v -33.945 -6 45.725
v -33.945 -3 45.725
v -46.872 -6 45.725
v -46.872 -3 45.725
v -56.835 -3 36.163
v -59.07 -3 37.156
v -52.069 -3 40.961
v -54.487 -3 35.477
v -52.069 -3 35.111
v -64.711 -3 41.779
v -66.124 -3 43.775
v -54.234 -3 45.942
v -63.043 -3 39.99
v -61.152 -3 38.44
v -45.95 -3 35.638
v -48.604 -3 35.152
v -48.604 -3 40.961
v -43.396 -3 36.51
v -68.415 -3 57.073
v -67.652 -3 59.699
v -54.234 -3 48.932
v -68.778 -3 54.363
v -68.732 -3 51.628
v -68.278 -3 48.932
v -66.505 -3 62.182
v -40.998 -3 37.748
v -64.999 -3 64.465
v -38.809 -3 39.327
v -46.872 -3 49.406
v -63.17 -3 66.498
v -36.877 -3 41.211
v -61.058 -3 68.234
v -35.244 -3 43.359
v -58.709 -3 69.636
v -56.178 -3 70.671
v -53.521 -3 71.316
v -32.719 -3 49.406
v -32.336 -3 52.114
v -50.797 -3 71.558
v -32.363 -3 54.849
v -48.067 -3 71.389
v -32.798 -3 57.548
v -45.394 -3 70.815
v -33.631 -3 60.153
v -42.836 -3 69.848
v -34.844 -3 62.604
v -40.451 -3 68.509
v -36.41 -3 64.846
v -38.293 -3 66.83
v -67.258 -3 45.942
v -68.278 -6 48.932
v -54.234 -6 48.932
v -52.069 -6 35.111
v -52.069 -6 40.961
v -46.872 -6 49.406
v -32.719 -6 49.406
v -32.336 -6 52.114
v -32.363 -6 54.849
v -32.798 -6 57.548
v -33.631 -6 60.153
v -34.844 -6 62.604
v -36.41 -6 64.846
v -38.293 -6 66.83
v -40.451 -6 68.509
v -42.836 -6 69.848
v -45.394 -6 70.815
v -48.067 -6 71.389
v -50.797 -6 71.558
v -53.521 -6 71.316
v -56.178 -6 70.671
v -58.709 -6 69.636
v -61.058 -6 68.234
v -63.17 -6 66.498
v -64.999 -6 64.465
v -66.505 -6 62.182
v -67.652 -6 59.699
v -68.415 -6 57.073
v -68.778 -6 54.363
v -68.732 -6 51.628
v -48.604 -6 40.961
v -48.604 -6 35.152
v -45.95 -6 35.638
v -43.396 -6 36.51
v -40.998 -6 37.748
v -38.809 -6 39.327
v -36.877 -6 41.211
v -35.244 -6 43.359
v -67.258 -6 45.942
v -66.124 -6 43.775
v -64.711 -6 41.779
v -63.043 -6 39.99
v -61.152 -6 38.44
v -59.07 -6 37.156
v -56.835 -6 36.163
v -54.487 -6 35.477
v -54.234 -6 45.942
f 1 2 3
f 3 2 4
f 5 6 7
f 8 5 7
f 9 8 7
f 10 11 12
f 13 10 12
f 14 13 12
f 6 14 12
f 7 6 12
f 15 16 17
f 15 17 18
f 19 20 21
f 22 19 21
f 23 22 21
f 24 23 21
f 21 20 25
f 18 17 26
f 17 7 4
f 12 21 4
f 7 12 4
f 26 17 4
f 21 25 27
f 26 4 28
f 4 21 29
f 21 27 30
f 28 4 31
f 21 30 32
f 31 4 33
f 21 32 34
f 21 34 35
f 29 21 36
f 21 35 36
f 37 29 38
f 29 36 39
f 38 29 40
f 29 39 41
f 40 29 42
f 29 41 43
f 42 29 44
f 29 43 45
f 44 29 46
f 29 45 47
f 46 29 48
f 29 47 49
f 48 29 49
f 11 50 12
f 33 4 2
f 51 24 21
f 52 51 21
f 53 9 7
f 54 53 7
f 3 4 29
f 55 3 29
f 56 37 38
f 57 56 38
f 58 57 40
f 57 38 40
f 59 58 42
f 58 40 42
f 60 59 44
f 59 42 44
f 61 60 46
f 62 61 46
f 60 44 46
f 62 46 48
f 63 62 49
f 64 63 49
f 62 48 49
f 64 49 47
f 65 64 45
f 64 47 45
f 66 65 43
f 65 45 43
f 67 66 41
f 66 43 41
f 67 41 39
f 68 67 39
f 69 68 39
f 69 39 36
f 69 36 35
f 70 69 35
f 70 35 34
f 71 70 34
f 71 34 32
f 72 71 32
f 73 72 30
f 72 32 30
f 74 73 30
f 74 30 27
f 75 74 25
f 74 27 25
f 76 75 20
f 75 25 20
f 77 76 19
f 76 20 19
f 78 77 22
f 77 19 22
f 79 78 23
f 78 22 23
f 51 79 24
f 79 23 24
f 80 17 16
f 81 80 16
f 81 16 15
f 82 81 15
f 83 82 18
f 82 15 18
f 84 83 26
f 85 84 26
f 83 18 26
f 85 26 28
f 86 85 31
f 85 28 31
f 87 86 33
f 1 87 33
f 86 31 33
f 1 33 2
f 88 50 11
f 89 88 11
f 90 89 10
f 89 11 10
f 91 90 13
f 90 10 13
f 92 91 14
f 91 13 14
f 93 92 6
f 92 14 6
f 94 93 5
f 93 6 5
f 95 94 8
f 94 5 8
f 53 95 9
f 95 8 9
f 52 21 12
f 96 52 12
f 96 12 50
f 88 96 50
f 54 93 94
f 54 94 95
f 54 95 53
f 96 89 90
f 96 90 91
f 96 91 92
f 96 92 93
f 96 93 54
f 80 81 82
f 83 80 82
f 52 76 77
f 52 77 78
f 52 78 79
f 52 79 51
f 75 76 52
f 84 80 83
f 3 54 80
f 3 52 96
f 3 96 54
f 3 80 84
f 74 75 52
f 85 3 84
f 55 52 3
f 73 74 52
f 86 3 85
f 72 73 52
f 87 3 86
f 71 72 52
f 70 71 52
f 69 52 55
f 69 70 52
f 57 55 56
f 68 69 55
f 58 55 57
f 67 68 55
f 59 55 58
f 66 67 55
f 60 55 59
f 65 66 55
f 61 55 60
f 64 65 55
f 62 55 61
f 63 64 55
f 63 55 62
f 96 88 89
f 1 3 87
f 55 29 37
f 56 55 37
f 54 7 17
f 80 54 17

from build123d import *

# Parameters (mm, degrees)
F2_DEPTH = 3
F4_DEPTH = 3


with BuildPart() as f2:
    # F1 (on face) → F2 (new body)
    with BuildSketch(Plane.XZ):
        with BuildLine():
            Line((-1.32116, -5.919504), (-1.32116, -8.640318))
            Line((-1.32116, -8.640318), (-17.590988, -8.640318))
            ThreePointArc((-17.590988, -8.640318), (0, -19.945099), (17.590988, -8.640318))
            Line((17.590988, -8.640318), (1.10096, -8.640318))
            Line((1.10096, -8.640318), (1.10096, -5.919504))
            Line((1.10096, -5.919504), (18.594568, -5.919504))
            ThreePointArc((18.594568, -5.919504), (0, 18.732423), (-18.594568, -5.919504))
            Line((-18.594568, -5.919504), (-18.539109, -5.919504))
            Line((-18.539109, -5.919504), (-1.32116, -5.919504))
        make_face()
    extrude(amount=F2_DEPTH)


with BuildPart() as f4:
    # F3 (on face) → F4 (new body)
    with BuildSketch(Plane.XZ.offset(3)):
        with BuildLine():
            Line((-54.234255, 45.941614), (-67.258485, 45.941614))
            ThreePointArc((-67.258485, 45.941614), (-61.151606, 38.439632), (-52.068938, 35.111145))
            Line((-52.068938, 35.111145), (-52.068938, 40.961377))
            Line((-52.068938, 40.961377), (-48.604425, 40.961377))
            Line((-48.604425, 40.961377), (-48.604425, 35.152427))
            ThreePointArc((-48.604425, 35.152427), (-39.874481, 38.497244), (-33.945055, 45.725081))
            Line((-33.945055, 45.725081), (-46.872169, 45.725081))
            Line((-46.872169, 45.725081), (-46.872169, 49.406122))
            Line((-46.872169, 49.406122), (-32.718549, 49.406122))
            ThreePointArc((-32.718549, 49.406122), (-50.796761, 71.557655), (-68.277544, 48.931689))
            Line((-68.277544, 48.931689), (-54.234255, 48.931689))
            Line((-54.234255, 48.931689), (-54.234255, 45.941614))
        make_face()
    extrude(amount=F4_DEPTH)


solid = f4.part
